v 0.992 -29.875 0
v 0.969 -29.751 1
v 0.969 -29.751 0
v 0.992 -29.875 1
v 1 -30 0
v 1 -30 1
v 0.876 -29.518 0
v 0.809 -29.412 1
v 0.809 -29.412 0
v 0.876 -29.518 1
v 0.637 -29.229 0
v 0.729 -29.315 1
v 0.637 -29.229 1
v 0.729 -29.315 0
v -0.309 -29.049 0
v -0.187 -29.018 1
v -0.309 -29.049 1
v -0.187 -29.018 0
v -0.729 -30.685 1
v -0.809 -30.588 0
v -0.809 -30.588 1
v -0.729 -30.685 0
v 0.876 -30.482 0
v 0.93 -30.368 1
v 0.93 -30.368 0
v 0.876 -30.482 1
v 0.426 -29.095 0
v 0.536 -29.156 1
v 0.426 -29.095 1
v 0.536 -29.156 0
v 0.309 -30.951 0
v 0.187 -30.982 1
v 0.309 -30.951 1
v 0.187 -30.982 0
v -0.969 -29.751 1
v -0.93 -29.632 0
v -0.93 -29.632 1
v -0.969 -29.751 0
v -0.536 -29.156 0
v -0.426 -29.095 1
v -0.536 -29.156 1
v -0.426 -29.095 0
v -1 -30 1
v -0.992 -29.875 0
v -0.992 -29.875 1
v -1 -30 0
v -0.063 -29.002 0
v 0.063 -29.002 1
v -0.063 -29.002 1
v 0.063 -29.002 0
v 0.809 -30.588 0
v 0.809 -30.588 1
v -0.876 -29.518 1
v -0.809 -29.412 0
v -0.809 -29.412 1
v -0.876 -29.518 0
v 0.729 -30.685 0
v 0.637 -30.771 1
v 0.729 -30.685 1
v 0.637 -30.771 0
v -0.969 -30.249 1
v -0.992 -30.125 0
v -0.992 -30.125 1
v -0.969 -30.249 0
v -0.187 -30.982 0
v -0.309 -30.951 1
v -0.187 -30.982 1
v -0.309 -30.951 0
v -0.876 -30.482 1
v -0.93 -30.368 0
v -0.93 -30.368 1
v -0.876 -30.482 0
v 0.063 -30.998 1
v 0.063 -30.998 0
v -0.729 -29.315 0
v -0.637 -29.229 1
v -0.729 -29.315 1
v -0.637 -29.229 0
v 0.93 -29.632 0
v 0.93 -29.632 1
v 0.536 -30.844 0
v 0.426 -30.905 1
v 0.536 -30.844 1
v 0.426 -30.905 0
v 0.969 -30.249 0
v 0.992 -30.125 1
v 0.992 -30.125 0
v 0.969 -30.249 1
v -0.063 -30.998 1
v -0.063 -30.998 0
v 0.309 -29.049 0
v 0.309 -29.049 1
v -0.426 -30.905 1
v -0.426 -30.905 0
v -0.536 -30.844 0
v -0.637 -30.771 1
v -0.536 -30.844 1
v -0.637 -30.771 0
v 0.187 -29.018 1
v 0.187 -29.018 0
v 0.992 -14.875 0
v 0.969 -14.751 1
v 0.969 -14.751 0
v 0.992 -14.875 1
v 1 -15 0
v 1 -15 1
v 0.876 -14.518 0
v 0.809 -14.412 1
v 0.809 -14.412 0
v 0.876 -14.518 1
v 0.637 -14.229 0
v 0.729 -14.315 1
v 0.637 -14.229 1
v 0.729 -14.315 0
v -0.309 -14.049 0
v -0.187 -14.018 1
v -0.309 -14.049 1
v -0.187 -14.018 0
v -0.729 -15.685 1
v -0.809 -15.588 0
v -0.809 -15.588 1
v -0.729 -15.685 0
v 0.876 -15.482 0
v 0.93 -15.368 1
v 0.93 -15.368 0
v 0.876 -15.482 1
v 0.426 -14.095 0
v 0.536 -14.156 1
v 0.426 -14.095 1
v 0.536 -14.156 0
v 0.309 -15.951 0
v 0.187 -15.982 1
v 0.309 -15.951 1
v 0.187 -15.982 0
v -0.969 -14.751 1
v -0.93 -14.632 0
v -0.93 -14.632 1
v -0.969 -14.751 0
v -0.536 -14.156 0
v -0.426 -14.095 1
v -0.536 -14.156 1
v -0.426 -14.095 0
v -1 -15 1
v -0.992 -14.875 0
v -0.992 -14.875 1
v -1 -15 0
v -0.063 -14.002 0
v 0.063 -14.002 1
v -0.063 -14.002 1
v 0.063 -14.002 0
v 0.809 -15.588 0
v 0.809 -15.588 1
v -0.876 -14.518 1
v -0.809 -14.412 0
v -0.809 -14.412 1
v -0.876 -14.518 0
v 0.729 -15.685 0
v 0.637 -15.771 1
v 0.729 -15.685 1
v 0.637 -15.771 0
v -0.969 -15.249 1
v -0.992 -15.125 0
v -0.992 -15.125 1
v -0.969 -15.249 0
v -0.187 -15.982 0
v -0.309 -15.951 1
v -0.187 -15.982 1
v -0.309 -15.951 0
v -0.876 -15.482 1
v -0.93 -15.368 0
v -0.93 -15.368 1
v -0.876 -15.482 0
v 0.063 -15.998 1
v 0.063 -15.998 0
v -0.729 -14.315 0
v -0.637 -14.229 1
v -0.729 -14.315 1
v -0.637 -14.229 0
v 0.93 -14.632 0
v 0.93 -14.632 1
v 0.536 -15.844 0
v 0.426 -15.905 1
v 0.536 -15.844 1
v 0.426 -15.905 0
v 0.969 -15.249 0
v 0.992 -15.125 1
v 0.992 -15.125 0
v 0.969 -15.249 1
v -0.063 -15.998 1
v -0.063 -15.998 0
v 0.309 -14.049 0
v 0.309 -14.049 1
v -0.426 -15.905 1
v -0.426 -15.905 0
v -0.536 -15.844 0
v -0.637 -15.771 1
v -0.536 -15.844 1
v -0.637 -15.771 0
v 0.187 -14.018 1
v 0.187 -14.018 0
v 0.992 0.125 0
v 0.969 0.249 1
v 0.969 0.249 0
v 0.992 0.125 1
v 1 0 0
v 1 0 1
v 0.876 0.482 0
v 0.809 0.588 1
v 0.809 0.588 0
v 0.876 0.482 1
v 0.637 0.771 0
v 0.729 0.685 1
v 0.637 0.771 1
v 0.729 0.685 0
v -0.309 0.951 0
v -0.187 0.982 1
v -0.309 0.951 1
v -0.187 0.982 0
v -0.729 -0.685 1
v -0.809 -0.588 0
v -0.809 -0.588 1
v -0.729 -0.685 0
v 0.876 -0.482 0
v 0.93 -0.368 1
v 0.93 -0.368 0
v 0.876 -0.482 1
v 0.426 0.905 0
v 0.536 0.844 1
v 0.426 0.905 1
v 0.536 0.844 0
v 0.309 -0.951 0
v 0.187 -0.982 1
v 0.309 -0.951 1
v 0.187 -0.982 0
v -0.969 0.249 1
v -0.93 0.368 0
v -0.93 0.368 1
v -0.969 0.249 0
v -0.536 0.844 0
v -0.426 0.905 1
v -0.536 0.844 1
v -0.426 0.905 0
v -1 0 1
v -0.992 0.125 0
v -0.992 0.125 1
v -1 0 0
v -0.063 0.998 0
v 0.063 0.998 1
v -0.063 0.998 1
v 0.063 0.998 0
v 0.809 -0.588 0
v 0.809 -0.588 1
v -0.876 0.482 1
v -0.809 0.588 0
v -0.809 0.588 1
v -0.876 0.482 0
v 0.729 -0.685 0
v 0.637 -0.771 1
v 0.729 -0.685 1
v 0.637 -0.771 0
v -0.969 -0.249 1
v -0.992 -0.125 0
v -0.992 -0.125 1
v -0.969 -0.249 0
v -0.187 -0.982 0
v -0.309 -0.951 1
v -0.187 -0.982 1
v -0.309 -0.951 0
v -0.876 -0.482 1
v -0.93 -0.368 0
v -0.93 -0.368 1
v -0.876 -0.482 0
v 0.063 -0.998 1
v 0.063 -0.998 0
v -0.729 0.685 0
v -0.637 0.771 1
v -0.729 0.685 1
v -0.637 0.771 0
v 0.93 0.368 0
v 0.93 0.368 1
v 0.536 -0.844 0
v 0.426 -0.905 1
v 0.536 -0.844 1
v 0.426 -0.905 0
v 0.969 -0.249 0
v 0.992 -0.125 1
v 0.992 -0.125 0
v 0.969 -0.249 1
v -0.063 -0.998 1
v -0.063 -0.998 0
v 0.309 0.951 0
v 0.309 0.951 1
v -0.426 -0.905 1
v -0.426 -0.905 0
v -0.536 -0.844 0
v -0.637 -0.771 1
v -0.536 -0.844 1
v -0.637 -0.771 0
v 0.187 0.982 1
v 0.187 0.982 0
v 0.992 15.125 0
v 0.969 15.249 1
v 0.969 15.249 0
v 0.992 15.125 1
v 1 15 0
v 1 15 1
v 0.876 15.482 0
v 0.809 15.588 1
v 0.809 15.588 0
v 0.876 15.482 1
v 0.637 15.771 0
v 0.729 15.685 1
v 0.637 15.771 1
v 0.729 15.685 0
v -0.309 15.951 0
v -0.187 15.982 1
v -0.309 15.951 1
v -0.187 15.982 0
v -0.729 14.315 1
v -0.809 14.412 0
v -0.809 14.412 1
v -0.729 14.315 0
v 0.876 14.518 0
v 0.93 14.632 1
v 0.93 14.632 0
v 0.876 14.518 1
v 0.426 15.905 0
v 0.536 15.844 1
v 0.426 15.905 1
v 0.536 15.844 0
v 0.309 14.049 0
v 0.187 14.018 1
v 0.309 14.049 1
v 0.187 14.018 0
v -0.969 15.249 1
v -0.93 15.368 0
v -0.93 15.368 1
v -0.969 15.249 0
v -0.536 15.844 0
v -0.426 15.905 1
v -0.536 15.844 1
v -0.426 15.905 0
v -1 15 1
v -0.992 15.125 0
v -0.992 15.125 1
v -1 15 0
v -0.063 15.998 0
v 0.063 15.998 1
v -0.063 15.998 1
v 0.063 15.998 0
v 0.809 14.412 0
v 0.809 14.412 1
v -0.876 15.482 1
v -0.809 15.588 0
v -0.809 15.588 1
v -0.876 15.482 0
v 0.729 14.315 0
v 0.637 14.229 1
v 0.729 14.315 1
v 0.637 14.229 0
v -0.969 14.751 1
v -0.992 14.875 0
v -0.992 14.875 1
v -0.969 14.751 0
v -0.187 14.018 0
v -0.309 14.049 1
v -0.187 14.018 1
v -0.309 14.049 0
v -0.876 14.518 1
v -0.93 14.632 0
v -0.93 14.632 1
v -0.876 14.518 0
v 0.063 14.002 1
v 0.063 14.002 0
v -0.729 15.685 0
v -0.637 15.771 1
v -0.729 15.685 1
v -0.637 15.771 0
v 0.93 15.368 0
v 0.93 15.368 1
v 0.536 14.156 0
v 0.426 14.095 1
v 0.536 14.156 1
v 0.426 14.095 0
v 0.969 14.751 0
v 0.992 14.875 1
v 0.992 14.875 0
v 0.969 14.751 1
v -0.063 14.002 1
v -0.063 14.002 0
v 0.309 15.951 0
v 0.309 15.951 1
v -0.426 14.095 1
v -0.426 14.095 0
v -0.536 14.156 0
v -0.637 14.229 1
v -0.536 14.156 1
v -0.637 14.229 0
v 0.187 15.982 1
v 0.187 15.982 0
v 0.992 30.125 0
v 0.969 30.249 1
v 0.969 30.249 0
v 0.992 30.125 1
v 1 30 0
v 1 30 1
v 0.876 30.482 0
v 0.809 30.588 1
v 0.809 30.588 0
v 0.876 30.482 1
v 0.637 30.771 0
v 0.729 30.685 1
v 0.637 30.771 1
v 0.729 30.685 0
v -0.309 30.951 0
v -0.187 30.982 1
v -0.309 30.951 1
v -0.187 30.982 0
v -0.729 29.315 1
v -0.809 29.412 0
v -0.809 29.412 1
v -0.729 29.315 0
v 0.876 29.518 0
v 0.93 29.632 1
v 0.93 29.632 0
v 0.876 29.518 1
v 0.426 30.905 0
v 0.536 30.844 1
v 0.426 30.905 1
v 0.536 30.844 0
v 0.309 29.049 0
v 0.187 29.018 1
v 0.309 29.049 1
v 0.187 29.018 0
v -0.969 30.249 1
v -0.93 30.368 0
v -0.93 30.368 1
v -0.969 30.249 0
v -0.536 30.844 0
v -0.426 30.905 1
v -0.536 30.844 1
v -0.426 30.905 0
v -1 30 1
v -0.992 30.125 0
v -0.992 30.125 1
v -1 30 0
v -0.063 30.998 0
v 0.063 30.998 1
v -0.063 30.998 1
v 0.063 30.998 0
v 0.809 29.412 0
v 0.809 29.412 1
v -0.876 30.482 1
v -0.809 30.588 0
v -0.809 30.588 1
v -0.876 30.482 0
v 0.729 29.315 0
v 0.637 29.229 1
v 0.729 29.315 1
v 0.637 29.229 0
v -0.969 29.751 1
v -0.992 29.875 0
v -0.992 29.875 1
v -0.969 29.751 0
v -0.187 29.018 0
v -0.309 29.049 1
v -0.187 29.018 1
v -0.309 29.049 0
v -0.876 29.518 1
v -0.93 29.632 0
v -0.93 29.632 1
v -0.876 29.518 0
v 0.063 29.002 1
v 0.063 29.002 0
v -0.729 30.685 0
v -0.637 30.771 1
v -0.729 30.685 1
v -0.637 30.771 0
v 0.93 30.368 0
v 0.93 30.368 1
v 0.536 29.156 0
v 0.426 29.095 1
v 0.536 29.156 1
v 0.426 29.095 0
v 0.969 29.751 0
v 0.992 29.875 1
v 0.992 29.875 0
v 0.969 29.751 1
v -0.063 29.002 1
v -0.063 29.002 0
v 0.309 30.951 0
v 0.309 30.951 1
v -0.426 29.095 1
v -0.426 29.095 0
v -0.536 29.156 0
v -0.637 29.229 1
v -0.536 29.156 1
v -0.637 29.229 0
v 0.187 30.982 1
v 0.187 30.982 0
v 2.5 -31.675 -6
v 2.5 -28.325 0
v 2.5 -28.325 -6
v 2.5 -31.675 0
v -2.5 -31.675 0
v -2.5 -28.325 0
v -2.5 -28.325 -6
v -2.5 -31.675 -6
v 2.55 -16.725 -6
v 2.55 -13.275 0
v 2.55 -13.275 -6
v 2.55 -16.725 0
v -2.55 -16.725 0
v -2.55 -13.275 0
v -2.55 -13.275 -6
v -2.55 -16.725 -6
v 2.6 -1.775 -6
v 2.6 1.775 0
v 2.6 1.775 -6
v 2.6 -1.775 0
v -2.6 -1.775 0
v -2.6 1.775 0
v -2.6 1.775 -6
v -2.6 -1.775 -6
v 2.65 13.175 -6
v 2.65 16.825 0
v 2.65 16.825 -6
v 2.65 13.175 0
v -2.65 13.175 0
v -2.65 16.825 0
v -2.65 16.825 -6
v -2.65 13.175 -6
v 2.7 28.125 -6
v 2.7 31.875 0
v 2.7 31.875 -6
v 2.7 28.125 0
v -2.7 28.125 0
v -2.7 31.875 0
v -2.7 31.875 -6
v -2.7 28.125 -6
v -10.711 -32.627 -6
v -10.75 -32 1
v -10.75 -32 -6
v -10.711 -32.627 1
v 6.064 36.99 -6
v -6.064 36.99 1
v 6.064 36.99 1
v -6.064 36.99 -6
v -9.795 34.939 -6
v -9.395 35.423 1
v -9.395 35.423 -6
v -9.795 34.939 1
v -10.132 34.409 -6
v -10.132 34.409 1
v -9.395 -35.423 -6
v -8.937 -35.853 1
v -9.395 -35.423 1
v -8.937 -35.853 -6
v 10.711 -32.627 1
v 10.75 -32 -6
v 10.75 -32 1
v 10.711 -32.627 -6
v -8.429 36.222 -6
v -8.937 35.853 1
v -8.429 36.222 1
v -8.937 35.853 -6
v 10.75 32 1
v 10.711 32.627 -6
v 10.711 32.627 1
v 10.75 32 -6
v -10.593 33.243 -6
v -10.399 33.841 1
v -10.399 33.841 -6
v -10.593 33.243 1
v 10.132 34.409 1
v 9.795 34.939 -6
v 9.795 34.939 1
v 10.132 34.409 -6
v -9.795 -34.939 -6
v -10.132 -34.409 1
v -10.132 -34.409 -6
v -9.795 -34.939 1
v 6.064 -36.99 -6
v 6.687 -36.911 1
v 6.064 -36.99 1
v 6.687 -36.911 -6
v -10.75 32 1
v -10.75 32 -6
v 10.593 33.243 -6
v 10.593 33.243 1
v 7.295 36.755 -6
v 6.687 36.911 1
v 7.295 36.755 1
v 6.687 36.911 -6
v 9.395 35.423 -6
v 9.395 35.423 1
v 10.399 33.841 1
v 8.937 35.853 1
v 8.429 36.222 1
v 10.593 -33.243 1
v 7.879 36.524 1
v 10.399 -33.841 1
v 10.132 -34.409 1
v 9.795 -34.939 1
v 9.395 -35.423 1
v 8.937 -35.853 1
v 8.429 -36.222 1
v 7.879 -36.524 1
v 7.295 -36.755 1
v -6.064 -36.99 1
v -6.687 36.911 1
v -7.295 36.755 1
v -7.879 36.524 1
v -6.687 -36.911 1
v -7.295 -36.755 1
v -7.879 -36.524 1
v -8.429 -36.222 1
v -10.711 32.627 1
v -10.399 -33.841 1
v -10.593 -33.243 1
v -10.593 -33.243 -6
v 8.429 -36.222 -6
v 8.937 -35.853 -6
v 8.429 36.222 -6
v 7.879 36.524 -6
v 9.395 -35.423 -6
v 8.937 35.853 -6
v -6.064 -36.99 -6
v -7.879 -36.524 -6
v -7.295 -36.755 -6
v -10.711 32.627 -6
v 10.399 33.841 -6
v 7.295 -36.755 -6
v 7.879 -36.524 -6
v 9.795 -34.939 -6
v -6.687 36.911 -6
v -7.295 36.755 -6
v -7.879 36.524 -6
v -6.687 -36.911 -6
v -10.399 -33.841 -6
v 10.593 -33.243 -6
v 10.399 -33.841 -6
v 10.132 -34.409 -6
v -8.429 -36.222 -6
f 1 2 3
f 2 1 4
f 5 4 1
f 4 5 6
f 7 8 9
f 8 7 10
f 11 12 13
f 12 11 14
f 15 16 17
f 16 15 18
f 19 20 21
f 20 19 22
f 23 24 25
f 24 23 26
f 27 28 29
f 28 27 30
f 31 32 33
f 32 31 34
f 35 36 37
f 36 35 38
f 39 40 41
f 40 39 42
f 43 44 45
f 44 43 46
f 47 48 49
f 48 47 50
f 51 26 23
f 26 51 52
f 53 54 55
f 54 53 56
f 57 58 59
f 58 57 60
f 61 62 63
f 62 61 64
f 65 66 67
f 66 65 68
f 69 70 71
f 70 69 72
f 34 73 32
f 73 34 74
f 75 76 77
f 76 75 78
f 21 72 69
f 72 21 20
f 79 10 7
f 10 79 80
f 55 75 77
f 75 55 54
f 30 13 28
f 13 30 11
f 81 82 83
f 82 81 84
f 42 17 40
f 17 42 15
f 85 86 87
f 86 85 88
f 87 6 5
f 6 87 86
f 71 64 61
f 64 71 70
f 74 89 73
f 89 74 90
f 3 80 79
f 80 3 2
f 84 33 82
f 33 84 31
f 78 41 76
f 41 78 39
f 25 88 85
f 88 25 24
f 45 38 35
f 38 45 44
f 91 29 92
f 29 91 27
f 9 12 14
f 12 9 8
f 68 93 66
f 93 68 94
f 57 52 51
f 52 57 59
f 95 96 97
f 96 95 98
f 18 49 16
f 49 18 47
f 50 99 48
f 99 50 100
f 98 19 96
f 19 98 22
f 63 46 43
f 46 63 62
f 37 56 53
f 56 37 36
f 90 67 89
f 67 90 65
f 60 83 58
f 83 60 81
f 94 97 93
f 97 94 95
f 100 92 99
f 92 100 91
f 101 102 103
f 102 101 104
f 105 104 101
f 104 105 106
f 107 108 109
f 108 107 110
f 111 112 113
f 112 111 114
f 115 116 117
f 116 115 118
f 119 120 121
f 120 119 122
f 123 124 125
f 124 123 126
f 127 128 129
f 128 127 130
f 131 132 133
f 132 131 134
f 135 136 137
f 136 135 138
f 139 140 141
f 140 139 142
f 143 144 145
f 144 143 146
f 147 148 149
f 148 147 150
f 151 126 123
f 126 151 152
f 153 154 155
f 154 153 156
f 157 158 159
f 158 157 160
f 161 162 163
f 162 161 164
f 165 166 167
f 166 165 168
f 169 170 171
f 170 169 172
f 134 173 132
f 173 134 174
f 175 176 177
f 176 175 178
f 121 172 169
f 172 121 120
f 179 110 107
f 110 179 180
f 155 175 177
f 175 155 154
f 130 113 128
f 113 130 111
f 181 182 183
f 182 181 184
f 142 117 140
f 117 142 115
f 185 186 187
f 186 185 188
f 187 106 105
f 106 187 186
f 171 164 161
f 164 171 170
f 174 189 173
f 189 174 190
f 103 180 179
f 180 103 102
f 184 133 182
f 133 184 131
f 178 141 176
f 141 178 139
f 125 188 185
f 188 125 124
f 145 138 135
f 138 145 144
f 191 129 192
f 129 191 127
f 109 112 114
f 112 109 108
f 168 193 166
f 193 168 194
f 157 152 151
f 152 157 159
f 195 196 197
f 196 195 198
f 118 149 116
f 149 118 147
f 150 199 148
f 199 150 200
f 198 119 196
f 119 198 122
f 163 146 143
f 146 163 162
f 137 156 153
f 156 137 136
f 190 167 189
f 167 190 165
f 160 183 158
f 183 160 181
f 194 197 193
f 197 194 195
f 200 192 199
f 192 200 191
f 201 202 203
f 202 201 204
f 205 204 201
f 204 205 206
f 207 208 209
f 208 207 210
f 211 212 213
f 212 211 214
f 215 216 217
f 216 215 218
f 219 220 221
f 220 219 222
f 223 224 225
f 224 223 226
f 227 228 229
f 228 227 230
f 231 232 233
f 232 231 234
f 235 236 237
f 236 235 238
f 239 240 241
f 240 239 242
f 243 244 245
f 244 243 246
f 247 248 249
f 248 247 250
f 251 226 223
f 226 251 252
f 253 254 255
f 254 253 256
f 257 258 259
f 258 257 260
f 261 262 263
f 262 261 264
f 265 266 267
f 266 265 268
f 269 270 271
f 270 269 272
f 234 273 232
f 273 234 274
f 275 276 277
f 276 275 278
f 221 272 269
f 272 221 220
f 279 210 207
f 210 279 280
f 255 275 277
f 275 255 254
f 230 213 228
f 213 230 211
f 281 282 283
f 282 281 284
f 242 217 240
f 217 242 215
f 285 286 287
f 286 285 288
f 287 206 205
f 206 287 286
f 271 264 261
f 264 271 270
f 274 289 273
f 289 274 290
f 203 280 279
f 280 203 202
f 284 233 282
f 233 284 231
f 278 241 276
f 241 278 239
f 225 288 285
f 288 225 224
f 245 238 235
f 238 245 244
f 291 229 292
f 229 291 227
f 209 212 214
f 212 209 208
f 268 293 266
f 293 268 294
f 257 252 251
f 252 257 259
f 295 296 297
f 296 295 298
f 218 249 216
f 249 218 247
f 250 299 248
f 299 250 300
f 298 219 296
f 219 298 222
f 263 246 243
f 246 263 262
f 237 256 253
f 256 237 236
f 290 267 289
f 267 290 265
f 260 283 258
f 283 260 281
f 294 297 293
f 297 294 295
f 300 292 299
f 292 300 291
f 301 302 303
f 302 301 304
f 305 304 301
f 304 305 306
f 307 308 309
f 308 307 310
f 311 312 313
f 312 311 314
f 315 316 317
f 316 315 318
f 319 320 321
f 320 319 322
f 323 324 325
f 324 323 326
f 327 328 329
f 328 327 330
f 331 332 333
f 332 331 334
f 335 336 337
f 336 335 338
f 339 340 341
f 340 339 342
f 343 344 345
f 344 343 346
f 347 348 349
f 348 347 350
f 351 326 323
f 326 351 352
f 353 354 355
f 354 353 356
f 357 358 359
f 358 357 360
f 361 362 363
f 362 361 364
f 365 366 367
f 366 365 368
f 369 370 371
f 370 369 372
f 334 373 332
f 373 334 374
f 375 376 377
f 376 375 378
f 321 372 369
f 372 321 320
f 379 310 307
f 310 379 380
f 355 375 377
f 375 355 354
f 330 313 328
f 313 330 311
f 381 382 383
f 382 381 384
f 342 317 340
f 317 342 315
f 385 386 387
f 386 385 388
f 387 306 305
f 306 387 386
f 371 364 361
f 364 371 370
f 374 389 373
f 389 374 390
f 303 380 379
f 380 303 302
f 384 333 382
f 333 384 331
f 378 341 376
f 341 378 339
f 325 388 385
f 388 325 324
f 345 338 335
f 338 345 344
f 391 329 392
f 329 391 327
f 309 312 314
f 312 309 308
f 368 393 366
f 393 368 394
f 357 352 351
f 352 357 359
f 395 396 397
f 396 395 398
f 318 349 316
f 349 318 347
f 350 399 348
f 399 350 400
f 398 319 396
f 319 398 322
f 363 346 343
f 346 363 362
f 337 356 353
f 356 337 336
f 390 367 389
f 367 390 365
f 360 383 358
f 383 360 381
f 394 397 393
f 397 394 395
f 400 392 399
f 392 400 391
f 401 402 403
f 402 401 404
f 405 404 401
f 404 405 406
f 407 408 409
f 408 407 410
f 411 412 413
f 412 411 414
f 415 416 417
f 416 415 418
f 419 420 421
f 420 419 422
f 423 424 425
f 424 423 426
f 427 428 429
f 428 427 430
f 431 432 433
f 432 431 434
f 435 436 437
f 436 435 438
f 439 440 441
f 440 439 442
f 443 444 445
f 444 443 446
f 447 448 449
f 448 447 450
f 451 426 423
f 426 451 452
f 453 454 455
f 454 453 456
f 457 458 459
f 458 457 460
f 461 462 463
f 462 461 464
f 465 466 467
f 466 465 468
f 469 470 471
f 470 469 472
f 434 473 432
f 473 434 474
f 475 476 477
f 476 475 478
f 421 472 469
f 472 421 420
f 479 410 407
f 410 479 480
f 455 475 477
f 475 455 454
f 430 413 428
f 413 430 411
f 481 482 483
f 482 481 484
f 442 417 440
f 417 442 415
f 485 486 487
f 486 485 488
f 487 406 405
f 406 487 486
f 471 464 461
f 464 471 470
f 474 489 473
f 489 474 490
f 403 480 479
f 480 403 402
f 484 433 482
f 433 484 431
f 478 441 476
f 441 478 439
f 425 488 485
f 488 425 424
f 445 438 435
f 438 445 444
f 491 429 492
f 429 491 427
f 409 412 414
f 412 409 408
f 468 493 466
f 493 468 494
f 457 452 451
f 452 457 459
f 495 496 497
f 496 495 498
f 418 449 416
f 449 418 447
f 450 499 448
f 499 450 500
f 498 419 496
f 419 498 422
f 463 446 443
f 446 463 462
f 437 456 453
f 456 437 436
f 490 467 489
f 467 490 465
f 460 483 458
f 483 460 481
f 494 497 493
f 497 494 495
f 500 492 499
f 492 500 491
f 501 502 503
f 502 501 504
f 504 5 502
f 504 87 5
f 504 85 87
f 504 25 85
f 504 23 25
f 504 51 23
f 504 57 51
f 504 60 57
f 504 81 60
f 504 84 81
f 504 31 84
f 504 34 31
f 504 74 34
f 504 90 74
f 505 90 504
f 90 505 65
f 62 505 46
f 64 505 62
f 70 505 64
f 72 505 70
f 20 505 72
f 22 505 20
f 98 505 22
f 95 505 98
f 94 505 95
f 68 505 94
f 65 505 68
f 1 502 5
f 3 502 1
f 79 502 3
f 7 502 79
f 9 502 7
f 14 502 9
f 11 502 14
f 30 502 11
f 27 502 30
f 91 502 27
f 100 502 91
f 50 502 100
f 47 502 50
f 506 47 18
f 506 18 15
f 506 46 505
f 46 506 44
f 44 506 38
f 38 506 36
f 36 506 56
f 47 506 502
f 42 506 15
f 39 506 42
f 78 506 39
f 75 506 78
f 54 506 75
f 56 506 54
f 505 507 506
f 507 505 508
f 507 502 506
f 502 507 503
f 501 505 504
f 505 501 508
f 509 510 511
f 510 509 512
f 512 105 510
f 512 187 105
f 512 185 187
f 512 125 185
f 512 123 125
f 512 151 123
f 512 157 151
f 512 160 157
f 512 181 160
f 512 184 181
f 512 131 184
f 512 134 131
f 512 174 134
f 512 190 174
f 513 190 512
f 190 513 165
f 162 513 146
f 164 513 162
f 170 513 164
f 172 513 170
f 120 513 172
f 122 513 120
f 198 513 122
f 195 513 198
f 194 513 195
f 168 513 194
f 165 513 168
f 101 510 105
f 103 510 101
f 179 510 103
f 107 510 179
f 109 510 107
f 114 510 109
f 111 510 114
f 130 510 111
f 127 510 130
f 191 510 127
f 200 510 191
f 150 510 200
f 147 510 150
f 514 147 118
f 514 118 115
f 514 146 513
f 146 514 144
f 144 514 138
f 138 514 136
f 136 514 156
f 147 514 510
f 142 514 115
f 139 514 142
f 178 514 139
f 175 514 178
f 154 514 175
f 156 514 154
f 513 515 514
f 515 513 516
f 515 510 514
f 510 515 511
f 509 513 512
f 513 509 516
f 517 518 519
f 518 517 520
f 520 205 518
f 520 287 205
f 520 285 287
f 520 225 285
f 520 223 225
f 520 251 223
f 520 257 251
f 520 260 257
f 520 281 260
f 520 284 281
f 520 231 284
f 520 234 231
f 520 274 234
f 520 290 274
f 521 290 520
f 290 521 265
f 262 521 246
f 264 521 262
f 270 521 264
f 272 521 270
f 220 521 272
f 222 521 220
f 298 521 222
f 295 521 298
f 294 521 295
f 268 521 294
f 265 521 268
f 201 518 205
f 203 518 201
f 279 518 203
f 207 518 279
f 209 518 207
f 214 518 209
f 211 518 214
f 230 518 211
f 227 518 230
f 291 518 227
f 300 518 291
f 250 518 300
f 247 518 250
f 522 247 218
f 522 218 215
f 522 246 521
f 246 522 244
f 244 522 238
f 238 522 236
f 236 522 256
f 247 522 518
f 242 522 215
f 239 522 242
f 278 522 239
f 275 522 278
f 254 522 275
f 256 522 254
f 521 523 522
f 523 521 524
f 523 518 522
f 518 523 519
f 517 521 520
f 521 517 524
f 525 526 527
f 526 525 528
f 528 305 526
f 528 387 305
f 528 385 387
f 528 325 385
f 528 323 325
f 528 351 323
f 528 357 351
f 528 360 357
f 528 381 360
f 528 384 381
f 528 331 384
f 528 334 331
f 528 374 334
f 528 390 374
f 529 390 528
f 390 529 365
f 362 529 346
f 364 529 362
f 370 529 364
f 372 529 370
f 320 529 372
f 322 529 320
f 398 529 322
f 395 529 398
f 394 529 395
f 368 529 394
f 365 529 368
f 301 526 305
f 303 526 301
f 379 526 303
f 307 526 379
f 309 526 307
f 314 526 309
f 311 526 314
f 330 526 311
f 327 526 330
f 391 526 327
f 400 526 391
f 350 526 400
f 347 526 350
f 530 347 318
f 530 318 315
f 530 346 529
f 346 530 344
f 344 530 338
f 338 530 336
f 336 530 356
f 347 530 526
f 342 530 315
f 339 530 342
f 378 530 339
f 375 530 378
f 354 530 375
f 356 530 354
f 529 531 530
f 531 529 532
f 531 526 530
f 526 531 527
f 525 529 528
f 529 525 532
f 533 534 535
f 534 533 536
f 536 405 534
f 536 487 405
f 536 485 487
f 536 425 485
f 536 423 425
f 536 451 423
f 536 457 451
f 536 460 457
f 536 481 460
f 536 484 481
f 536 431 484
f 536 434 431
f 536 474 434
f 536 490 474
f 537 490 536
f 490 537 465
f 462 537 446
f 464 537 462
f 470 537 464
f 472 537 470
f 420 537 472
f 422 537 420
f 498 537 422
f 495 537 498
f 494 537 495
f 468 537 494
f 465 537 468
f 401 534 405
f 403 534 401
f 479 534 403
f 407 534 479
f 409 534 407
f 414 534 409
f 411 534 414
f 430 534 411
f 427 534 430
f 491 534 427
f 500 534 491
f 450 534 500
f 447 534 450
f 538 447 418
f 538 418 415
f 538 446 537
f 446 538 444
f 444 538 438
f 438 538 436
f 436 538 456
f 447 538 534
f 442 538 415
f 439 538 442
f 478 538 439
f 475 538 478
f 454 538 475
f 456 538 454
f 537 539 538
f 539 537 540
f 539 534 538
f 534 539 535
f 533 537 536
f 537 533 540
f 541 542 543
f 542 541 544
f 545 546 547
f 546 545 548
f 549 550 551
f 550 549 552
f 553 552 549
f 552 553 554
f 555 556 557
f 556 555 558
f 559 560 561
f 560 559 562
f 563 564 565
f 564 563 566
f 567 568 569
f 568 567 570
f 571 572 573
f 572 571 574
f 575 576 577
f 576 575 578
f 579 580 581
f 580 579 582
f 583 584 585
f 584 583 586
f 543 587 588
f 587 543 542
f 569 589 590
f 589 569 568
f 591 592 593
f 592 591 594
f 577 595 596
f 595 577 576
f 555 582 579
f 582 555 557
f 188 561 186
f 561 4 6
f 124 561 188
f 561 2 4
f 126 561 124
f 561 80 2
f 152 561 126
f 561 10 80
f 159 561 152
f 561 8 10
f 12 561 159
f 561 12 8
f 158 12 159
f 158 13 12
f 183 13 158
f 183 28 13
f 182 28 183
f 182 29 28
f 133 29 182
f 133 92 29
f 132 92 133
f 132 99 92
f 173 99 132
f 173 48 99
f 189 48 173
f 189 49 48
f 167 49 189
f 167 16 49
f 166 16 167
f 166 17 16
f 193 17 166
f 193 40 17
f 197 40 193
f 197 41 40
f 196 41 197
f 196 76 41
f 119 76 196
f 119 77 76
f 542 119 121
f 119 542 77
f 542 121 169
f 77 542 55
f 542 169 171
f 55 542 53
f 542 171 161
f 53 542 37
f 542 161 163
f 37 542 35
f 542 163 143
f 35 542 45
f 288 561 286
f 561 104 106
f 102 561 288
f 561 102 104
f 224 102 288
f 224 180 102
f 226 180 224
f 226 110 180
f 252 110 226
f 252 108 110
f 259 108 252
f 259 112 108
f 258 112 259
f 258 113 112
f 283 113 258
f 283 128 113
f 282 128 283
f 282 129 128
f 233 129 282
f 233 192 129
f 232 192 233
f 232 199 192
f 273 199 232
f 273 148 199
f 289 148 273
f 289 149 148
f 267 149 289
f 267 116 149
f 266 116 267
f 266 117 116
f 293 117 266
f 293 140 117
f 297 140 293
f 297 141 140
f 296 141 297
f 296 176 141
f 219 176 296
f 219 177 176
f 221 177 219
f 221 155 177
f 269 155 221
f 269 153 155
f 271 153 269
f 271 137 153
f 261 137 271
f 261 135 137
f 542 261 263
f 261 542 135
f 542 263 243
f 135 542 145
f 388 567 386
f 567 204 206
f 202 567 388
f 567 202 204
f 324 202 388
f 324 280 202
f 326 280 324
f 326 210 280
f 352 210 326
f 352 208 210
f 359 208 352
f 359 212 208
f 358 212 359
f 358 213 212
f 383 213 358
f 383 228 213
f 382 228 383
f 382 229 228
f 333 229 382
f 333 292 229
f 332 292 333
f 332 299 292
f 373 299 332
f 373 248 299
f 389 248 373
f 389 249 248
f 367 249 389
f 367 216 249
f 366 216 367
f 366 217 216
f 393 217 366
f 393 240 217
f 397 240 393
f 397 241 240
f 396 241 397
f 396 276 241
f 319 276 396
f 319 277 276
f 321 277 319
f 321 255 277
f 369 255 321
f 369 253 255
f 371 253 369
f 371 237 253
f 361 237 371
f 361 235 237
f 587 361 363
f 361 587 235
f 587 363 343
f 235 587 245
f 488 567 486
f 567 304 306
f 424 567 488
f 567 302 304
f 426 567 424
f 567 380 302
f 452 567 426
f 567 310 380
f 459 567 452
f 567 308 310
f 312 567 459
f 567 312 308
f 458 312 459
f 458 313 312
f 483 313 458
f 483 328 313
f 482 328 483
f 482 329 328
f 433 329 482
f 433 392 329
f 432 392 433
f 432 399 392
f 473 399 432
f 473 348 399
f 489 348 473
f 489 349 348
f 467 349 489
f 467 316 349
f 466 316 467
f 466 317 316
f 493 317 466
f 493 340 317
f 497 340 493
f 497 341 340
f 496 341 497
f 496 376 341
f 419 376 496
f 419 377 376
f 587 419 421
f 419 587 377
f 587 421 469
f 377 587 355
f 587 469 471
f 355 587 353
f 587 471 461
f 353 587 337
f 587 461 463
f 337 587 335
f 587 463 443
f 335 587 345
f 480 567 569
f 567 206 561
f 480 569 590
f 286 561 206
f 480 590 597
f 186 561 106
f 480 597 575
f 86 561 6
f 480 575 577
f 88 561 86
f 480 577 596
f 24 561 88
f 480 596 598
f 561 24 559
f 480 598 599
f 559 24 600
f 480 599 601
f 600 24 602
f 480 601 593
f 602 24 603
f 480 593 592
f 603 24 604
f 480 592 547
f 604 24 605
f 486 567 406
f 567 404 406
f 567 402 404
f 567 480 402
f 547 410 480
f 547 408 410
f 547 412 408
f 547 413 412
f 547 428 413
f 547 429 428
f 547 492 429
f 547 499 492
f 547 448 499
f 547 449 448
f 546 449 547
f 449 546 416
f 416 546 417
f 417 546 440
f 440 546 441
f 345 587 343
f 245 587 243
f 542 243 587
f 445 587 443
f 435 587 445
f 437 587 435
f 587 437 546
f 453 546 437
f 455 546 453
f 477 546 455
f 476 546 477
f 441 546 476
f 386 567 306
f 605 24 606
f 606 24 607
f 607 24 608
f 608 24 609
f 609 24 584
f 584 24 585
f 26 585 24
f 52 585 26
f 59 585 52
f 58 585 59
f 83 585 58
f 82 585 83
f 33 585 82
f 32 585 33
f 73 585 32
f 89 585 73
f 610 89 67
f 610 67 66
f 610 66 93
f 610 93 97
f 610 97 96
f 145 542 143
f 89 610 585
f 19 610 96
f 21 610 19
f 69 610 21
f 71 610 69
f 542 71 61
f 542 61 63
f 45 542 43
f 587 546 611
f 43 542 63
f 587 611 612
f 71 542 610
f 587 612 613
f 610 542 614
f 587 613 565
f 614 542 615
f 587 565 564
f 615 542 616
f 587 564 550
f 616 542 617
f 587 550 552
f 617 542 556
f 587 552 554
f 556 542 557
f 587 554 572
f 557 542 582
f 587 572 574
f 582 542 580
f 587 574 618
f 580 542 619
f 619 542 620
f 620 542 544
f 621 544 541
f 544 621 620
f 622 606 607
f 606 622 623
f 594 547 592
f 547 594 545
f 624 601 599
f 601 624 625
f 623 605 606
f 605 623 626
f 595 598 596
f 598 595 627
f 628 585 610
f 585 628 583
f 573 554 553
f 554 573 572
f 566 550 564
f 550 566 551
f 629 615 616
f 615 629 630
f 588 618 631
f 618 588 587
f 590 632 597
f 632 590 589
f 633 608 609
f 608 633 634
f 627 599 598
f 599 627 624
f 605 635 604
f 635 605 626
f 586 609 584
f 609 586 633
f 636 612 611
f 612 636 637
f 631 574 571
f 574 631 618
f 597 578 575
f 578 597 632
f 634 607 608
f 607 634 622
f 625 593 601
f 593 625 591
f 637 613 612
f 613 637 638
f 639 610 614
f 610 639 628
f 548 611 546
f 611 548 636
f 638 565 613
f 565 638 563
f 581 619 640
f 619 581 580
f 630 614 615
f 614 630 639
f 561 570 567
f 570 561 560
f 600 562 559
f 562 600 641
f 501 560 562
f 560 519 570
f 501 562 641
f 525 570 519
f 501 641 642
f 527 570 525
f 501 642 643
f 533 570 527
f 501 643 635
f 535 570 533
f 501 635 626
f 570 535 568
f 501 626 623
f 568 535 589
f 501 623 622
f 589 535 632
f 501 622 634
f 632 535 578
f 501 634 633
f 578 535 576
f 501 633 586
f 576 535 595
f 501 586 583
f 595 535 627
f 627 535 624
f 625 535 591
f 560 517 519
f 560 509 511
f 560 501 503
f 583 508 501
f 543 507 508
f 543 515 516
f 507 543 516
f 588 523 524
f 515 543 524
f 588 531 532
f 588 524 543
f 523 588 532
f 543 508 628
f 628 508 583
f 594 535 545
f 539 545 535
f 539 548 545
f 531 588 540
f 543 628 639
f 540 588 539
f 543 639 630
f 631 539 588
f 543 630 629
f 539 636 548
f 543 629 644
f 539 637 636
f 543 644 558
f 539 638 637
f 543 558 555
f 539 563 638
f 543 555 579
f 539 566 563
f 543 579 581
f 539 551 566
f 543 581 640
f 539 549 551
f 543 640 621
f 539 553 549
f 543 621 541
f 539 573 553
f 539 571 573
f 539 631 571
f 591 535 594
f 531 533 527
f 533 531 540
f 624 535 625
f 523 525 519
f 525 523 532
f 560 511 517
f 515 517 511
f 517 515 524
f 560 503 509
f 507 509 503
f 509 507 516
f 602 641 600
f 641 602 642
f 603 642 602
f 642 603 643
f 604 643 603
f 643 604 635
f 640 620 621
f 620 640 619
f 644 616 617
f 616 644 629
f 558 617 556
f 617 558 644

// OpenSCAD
$fn = 50;


difference() {
	union() {
		translate(v = [0, 0, -6]) {
			hull() {
				translate(v = [-5.7500000000, 32.0000000000, 0]) {
					cylinder(h = 7, r = 5);
				}
				translate(v = [5.7500000000, 32.0000000000, 0]) {
					cylinder(h = 7, r = 5);
				}
				translate(v = [-5.7500000000, -32.0000000000, 0]) {
					cylinder(h = 7, r = 5);
				}
				translate(v = [5.7500000000, -32.0000000000, 0]) {
					cylinder(h = 7, r = 5);
				}
			}
		}
	}
	union() {
		translate(v = [0, -30, 2]) {
			rotate(a = [0, 0, 0]) {
				difference() {
					union() {
						translate(v = [0, 0, -12.0000000000]) {
							cylinder(h = 12, r = 0.7500000000);
						}
						cylinder(h = 252.5000000000, r = 2.7500000000);
						translate(v = [0, 0, -12.0000000000]) {
							cylinder(h = 12, r = 1.0000000000);
						}
						translate(v = [-1.2500000000, -2.7500000000, -0.3000000000]) {
							cube(size = [2.5000000000, 5.5000000000, 0.3000000000]);
						}
						translate(v = [-1.2500000000, -1.2500000000, -0.6000000000]) {
							cube(size = [2.5000000000, 2.5000000000, 0.3000000000]);
						}
						translate(v = [0, 0, -12.0000000000]) {
							cylinder(h = 12, r = 0.7500000000);
						}
					}
					union();
				}
			}
		}
		translate(v = [0, -15, 2]) {
			rotate(a = [0, 0, 0]) {
				difference() {
					union() {
						translate(v = [0, 0, -12.0000000000]) {
							cylinder(h = 12, r = 0.7500000000);
						}
						cylinder(h = 252.5000000000, r = 2.7500000000);
						translate(v = [0, 0, -12.0000000000]) {
							cylinder(h = 12, r = 1.0000000000);
						}
						translate(v = [-1.2500000000, -2.7500000000, -0.3000000000]) {
							cube(size = [2.5000000000, 5.5000000000, 0.3000000000]);
						}
						translate(v = [-1.2500000000, -1.2500000000, -0.6000000000]) {
							cube(size = [2.5000000000, 2.5000000000, 0.3000000000]);
						}
						translate(v = [0, 0, -12.0000000000]) {
							cylinder(h = 12, r = 0.7500000000);
						}
					}
					union();
				}
			}
		}
		translate(v = [0, 0, 2]) {
			rotate(a = [0, 0, 0]) {
				difference() {
					union() {
						translate(v = [0, 0, -12.0000000000]) {
							cylinder(h = 12, r = 0.7500000000);
						}
						cylinder(h = 252.5000000000, r = 2.7500000000);
						translate(v = [0, 0, -12.0000000000]) {
							cylinder(h = 12, r = 1.0000000000);
						}
						translate(v = [-1.2500000000, -2.7500000000, -0.3000000000]) {
							cube(size = [2.5000000000, 5.5000000000, 0.3000000000]);
						}
						translate(v = [-1.2500000000, -1.2500000000, -0.6000000000]) {
							cube(size = [2.5000000000, 2.5000000000, 0.3000000000]);
						}
						translate(v = [0, 0, -12.0000000000]) {
							cylinder(h = 12, r = 0.7500000000);
						}
					}
					union();
				}
			}
		}
		translate(v = [0, 15, 2]) {
			rotate(a = [0, 0, 0]) {
				difference() {
					union() {
						translate(v = [0, 0, -12.0000000000]) {
							cylinder(h = 12, r = 0.7500000000);
						}
						cylinder(h = 252.5000000000, r = 2.7500000000);
						translate(v = [0, 0, -12.0000000000]) {
							cylinder(h = 12, r = 1.0000000000);
						}
						translate(v = [-1.2500000000, -2.7500000000, -0.3000000000]) {
							cube(size = [2.5000000000, 5.5000000000, 0.3000000000]);
						}
						translate(v = [-1.2500000000, -1.2500000000, -0.6000000000]) {
							cube(size = [2.5000000000, 2.5000000000, 0.3000000000]);
						}
						translate(v = [0, 0, -12.0000000000]) {
							cylinder(h = 12, r = 0.7500000000);
						}
					}
					union();
				}
			}
		}
		translate(v = [0, 30, 2]) {
			rotate(a = [0, 0, 0]) {
				difference() {
					union() {
						translate(v = [0, 0, -12.0000000000]) {
							cylinder(h = 12, r = 0.7500000000);
						}
						cylinder(h = 252.5000000000, r = 2.7500000000);
						translate(v = [0, 0, -12.0000000000]) {
							cylinder(h = 12, r = 1.0000000000);
						}
						translate(v = [-1.2500000000, -2.7500000000, -0.3000000000]) {
							cube(size = [2.5000000000, 5.5000000000, 0.3000000000]);
						}
						translate(v = [-1.2500000000, -1.2500000000, -0.6000000000]) {
							cube(size = [2.5000000000, 2.5000000000, 0.3000000000]);
						}
						translate(v = [0, 0, -12.0000000000]) {
							cylinder(h = 12, r = 0.7500000000);
						}
					}
					union();
				}
			}
		}
		translate(v = [-2.5000000000, -31.6750000000, -50]) {
			cube(size = [5.0000000000, 3.3500000000, 50]);
		}
		translate(v = [-2.5500000000, -16.7250000000, -50]) {
			cube(size = [5.1000000000, 3.4500000000, 50]);
		}
		translate(v = [-2.6000000000, -1.7750000000, -50]) {
			cube(size = [5.2000000000, 3.5500000000, 50]);
		}
		translate(v = [-2.6500000000, 13.1750000000, -50]) {
			cube(size = [5.3000000000, 3.6500000000, 50]);
		}
		translate(v = [-2.7000000000, 28.1250000000, -50]) {
			cube(size = [5.4000000000, 3.7500000000, 50]);
		}
	}
}
